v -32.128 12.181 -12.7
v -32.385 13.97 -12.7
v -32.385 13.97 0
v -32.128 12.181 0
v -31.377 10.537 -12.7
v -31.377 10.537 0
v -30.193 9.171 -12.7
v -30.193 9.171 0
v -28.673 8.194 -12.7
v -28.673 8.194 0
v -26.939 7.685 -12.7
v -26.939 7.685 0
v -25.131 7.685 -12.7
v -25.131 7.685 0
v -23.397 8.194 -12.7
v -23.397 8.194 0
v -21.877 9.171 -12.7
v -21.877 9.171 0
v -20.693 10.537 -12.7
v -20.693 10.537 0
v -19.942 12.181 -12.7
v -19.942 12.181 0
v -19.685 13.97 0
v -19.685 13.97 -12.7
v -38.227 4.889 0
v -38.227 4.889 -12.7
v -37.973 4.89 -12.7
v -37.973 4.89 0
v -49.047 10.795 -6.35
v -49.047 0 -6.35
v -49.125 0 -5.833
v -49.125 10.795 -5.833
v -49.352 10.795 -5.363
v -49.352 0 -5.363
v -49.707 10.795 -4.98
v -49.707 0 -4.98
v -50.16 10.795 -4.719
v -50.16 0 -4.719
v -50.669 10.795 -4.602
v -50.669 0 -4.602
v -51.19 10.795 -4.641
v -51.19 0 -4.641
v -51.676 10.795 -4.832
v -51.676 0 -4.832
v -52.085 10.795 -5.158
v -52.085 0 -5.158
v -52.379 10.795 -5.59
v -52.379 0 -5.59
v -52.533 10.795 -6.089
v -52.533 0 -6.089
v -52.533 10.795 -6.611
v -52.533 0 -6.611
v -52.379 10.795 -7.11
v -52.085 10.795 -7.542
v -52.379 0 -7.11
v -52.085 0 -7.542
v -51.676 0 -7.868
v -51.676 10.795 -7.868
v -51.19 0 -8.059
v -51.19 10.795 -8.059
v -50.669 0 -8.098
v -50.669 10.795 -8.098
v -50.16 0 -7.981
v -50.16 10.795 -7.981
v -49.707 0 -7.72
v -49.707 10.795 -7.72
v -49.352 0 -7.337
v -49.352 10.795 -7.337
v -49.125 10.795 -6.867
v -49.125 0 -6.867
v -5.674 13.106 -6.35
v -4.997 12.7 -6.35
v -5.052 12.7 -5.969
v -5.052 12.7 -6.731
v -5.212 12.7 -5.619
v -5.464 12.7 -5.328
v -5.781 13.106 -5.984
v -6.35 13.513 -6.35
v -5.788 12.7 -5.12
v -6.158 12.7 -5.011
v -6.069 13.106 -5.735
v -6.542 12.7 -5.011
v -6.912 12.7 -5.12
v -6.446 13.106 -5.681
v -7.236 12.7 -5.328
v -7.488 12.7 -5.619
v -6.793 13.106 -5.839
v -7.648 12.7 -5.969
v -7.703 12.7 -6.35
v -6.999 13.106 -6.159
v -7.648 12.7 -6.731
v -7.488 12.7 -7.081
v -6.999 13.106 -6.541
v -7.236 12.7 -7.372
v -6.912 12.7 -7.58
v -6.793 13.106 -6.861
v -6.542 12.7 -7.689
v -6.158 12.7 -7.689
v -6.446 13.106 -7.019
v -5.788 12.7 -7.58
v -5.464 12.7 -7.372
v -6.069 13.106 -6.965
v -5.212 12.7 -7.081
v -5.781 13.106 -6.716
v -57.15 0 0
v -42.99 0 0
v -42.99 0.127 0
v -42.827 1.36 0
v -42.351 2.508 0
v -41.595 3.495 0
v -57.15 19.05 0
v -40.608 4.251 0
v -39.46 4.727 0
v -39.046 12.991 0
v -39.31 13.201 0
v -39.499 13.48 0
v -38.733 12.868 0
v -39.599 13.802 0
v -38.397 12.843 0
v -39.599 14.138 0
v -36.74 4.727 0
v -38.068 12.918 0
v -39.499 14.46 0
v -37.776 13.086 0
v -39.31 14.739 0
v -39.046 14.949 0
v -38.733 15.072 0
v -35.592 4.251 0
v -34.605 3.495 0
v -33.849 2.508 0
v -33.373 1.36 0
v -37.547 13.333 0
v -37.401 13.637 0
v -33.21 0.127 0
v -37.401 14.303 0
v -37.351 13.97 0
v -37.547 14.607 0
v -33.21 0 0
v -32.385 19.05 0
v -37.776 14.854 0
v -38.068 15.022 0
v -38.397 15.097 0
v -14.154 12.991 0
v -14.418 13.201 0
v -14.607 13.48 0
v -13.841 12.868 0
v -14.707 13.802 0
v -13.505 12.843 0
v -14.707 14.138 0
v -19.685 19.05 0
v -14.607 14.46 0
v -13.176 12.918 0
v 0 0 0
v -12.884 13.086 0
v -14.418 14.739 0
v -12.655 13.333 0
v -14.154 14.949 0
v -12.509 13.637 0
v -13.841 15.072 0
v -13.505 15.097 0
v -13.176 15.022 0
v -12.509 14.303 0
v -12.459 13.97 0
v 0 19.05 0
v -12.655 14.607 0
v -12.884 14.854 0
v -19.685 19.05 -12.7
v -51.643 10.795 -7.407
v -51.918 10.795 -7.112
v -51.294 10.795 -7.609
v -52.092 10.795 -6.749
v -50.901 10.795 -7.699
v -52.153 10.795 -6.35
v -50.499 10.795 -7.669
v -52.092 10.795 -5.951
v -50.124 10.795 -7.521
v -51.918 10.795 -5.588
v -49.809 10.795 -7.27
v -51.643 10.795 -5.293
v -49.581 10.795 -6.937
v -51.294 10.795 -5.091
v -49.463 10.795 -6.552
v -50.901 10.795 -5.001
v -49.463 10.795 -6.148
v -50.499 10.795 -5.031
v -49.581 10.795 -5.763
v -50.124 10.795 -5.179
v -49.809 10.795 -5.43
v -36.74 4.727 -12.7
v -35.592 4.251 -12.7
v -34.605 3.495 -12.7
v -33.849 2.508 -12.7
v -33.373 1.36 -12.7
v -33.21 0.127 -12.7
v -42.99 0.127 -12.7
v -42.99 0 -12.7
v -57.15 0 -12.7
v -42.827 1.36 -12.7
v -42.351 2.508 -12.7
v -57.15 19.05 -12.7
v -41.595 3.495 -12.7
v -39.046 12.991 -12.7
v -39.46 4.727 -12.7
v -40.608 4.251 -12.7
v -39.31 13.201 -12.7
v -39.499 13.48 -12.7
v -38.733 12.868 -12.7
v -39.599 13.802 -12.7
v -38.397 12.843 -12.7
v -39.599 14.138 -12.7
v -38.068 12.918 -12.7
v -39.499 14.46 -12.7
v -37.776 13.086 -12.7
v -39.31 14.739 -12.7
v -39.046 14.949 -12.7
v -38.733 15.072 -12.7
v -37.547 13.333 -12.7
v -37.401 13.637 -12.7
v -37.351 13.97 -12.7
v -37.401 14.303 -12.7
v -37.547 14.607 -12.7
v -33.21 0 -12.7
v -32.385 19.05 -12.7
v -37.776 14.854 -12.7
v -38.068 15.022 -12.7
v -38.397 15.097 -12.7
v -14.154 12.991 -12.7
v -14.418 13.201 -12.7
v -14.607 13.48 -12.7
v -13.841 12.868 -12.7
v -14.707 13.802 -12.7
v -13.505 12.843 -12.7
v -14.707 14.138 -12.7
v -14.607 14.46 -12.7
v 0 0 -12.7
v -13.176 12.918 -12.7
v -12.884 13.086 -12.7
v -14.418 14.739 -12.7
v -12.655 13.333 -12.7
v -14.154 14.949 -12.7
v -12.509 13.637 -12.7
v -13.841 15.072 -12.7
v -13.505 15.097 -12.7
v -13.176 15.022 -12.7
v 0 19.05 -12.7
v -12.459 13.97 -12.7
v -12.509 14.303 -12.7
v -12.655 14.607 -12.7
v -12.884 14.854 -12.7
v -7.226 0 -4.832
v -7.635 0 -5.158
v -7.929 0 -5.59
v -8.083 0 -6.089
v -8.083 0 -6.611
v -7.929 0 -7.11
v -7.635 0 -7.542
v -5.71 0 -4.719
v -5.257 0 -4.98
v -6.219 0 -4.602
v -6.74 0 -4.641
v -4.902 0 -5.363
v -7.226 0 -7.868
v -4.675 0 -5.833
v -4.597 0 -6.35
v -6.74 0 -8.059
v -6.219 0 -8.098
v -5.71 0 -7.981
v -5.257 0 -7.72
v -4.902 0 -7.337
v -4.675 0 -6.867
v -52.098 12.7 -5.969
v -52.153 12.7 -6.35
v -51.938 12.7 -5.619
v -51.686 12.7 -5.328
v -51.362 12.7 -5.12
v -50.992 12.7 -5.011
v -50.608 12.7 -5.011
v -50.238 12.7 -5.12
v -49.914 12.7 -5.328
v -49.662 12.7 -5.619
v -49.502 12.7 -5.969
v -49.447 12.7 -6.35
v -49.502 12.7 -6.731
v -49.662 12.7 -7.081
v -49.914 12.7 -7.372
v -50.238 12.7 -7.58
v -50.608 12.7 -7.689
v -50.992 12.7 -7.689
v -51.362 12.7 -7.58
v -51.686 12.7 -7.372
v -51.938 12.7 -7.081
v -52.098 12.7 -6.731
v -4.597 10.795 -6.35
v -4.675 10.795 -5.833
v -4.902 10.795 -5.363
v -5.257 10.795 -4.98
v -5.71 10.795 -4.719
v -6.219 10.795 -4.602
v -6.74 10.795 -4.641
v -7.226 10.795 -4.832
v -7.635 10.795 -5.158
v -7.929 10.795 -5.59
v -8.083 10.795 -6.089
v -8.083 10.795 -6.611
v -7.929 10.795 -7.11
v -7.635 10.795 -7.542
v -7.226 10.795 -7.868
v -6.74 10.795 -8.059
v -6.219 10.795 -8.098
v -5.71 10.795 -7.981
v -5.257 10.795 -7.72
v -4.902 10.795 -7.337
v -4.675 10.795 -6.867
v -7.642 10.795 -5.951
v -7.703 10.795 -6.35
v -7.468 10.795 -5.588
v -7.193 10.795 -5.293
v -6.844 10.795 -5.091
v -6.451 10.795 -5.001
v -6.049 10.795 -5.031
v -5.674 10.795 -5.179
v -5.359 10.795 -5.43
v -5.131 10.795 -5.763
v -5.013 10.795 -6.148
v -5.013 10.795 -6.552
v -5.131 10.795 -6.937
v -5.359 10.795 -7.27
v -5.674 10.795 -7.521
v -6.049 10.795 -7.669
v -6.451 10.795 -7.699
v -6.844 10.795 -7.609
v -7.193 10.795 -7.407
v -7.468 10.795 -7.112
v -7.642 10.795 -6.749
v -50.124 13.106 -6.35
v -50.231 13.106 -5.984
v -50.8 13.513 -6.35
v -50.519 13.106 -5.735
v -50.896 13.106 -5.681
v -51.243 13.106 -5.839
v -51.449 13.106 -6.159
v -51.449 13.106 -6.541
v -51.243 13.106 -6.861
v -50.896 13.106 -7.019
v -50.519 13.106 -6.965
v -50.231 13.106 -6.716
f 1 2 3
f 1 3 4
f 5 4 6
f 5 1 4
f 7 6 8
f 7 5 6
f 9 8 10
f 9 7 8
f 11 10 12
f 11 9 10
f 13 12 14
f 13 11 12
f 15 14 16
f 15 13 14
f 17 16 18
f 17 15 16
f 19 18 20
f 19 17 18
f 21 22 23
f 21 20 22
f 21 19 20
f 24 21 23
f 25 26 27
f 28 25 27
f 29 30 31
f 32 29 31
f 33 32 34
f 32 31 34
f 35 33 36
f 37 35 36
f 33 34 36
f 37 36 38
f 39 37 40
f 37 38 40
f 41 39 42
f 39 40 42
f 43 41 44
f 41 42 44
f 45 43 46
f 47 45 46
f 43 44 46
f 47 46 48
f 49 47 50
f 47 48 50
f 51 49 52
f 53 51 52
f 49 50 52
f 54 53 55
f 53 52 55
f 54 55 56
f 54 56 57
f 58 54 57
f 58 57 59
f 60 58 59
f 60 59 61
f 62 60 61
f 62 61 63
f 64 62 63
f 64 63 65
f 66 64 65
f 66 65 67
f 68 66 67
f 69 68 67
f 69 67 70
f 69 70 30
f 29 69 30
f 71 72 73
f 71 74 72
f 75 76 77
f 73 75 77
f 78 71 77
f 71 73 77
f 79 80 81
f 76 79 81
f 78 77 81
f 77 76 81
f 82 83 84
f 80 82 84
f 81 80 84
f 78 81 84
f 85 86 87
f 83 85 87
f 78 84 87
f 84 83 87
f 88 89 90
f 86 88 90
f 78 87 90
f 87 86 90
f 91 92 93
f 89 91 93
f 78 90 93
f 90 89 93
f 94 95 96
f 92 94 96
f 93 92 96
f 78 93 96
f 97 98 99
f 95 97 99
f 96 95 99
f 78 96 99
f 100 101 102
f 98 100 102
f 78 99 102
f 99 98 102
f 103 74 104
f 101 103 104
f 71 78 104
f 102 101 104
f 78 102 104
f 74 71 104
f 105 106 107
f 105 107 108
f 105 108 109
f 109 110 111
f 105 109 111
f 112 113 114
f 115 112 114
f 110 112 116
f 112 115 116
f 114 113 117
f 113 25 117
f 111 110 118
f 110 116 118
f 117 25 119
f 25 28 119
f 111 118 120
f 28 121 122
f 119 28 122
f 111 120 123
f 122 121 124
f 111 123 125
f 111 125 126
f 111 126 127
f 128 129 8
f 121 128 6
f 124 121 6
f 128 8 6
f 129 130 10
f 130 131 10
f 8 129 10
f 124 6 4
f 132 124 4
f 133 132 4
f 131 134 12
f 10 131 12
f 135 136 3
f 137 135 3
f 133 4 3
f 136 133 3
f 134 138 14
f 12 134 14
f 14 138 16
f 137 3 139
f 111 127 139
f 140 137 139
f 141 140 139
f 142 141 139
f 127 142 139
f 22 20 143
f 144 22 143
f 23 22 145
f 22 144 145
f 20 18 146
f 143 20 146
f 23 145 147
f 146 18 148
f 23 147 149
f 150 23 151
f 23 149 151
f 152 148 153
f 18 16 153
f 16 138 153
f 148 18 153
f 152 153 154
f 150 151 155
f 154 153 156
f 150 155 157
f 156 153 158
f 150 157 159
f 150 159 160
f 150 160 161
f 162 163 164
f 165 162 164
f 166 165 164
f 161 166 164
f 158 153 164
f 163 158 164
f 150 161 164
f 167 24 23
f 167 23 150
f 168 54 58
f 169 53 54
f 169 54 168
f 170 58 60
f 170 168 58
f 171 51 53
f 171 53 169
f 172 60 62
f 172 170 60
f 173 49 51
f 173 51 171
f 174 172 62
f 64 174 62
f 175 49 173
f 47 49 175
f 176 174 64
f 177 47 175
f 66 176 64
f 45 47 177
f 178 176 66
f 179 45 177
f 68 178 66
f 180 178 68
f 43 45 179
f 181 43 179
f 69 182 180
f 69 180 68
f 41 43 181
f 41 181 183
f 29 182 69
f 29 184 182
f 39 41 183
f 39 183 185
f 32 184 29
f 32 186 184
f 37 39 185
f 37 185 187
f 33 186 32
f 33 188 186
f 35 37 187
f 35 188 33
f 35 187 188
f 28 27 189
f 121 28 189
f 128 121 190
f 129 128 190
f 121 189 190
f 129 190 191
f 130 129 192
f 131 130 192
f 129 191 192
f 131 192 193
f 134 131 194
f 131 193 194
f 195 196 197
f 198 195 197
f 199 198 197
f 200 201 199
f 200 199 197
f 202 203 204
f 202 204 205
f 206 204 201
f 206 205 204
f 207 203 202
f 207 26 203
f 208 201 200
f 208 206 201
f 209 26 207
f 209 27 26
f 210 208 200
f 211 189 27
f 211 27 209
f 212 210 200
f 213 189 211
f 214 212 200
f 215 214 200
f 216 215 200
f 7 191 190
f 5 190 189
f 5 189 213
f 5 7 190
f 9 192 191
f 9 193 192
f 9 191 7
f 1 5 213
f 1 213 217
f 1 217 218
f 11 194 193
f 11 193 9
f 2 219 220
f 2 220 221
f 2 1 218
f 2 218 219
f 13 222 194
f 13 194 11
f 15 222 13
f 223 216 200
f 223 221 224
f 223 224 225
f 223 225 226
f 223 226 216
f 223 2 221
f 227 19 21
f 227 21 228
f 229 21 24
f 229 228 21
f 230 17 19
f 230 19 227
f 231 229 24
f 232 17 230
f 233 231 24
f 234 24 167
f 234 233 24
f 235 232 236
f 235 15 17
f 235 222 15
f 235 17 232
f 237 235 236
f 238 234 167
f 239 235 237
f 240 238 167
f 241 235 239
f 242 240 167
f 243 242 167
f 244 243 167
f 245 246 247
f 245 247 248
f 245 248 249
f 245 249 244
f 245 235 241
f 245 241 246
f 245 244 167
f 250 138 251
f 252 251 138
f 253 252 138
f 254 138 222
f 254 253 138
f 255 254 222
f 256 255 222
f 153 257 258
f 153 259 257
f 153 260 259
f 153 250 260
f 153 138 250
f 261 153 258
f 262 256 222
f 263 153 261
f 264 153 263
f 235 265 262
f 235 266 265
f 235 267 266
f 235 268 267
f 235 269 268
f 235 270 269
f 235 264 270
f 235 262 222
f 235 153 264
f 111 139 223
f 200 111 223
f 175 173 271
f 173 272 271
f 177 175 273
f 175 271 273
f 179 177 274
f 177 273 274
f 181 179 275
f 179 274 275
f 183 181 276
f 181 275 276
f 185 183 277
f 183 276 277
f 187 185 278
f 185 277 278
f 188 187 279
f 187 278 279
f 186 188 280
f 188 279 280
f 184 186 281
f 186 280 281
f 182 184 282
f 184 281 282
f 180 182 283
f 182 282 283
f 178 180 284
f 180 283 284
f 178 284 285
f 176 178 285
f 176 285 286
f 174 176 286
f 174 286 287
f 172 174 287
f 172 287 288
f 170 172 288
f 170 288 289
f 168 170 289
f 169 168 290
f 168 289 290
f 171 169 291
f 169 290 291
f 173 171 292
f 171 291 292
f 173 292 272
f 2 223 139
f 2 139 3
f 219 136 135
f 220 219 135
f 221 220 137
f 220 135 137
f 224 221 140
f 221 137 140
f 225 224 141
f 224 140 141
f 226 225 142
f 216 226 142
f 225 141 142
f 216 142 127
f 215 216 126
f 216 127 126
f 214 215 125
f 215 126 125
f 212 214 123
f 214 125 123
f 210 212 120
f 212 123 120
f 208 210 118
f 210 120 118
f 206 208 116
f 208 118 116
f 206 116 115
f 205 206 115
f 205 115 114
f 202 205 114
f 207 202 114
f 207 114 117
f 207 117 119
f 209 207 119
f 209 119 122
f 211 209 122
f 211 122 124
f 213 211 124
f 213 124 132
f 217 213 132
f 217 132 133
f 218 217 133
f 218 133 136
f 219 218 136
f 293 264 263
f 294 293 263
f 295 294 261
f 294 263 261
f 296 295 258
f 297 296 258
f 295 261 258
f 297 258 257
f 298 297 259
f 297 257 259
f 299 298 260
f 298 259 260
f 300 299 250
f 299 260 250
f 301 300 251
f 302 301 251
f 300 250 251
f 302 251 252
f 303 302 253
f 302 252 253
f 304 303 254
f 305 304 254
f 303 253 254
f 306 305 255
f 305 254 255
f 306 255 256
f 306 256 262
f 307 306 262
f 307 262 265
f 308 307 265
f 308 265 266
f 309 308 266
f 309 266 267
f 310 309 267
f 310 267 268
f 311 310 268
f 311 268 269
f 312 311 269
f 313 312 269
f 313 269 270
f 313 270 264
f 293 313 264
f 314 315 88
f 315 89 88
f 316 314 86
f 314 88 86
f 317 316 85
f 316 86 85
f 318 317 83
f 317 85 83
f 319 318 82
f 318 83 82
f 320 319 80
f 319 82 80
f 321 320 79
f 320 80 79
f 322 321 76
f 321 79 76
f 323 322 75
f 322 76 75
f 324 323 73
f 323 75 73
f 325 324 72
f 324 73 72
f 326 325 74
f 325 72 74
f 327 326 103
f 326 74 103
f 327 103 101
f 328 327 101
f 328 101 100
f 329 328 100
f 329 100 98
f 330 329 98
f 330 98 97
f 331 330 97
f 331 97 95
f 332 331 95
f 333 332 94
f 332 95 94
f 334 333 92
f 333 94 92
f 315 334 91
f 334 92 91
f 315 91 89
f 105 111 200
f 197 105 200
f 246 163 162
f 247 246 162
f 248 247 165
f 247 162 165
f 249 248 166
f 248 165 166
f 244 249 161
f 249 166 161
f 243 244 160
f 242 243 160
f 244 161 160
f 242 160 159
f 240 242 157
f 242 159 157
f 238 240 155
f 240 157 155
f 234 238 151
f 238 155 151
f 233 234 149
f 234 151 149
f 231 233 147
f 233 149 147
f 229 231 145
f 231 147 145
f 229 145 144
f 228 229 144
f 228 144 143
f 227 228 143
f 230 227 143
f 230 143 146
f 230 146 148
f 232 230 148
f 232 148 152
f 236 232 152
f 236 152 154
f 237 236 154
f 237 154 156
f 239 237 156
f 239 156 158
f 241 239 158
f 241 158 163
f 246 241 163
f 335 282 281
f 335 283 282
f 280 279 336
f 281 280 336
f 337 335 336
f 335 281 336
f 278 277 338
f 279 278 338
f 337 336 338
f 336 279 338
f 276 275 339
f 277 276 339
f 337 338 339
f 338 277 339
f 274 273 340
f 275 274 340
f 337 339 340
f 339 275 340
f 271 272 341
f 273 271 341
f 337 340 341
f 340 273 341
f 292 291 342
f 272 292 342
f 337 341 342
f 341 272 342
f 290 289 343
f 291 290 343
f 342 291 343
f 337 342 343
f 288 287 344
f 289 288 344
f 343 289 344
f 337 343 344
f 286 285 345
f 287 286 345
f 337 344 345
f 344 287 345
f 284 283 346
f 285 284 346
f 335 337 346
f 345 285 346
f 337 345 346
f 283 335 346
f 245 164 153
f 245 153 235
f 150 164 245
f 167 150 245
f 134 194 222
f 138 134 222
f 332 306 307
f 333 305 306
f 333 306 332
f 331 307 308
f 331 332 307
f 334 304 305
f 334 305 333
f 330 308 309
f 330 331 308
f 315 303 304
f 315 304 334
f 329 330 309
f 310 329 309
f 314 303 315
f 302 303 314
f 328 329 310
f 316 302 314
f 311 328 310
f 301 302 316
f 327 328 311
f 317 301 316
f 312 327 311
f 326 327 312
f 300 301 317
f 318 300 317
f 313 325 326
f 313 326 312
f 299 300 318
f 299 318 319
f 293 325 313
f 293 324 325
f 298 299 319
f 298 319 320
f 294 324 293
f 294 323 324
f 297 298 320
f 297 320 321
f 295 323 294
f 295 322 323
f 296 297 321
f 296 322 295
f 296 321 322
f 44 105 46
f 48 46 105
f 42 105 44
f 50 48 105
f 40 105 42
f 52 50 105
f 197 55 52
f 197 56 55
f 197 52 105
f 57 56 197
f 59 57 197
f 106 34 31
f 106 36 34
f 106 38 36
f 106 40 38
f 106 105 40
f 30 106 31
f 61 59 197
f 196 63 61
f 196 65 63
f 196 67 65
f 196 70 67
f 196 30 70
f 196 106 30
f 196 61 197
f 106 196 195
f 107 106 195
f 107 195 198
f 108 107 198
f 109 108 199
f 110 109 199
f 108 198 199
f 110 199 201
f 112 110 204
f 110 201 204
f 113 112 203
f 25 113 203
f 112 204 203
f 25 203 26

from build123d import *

# Parameters (mm, degrees)
SKETCH1_W                       = 12.7
SKETCH1_H                       = 19.05
BOSS_EXTRUDE1_DEPTH             = 57.15
F_6_32_TAPPED_HOLE1_D           = 2.7051
F_6_32_TAPPED_HOLE1_DEPTH       = 12.7
F_6_32_TAPPED_HOLE1_CBORE_D     = 3.5052
F_6_32_TAPPED_HOLE1_CBORE_DEPTH = 10.795
F_6_32_TAPPED_HOLE1_TIP         = 0.81269403
CUT_EXTRUDE2_DEPTH              = 62.565534189
F_4_40_TAPPED_HOLE1_D           = 2.2606
CUT_EXTRUDE3_DEPTH              = 62.565534189


with BuildPart() as part:
    # Sketch1 → Boss-Extrude1 (new body)
    with BuildSketch(Plane(origin=(0, 0, 0), x_dir=(0, 0, -1), z_dir=(1, 0, 0))):
        with Locations((6.35, 9.525)):
            Rectangle(SKETCH1_W, SKETCH1_H)
    extrude(amount=-BOSS_EXTRUDE1_DEPTH)

    # #6-32 Tapped Hole1
    with Locations(Plane(origin=(23.287154444, 0, 3.188270264), x_dir=(1, 0, 0), z_dir=(0, -1, 0))):
        with Locations((-29.637154444, -9.538270264), (-74.087154444, -9.538270264)):
            CounterBoreHole(F_6_32_TAPPED_HOLE1_D / 2, F_6_32_TAPPED_HOLE1_CBORE_D / 2, F_6_32_TAPPED_HOLE1_CBORE_DEPTH, depth=F_6_32_TAPPED_HOLE1_DEPTH)
            with Locations((0, 0, -(F_6_32_TAPPED_HOLE1_DEPTH + F_6_32_TAPPED_HOLE1_TIP / 2))):  # 118° drill point
                Cone(0, F_6_32_TAPPED_HOLE1_D / 2, F_6_32_TAPPED_HOLE1_TIP, mode=Mode.SUBTRACT)

    # Sketch5 → Cut-Extrude2 (cut, through all)
    with BuildSketch(Plane(origin=(0, 0, -12.7), x_dir=(-1, 0, 0), z_dir=(0, 0, -1))):
        with BuildLine():
            Line((32.385, 19.05), (32.385, 13.97))
            ThreePointArc((32.385, 13.97), (26.035, 7.62), (19.685, 13.97))
            Line((19.685, 13.97), (19.685, 19.05))
            ThreePointArc((19.685, 19.05), (26.035, 25.4), (32.385, 19.05))
        make_face()
    extrude(amount=-CUT_EXTRUDE2_DEPTH, mode=Mode.SUBTRACT)

    # #4-40 Tapped Hole1 (through all)
    with Locations(Plane(origin=(0, 0, -12.7), x_dir=(-1, 0, 0), z_dir=(0, 0, -1))):
        with Locations((13.589, 13.97), (38.481, 13.97)):
            Hole(F_4_40_TAPPED_HOLE1_D / 2)

    # Sketch6 → Cut-Extrude3 (cut, through all)
    with BuildSketch(Plane(origin=(0, 0, -12.7), x_dir=(-1, 0, 0), z_dir=(0, 0, -1))):
        with BuildLine():
            Line((33.2105, 0), (42.9895, 0))
            Line((42.9895, 0), (42.9895, 0.127))
            ThreePointArc((42.9895, 0.127), (41.594596045, 3.494596045), (38.227, 4.8895))
            Line((38.227, 4.8895), (37.973, 4.8895))
            ThreePointArc((37.973, 4.8895), (34.605403955, 3.494596045), (33.2105, 0.127))
            Line((33.2105, 0.127), (33.2105, 0))
        make_face()
    extrude(amount=-CUT_EXTRUDE3_DEPTH, mode=Mode.SUBTRACT)


solid = part.part
